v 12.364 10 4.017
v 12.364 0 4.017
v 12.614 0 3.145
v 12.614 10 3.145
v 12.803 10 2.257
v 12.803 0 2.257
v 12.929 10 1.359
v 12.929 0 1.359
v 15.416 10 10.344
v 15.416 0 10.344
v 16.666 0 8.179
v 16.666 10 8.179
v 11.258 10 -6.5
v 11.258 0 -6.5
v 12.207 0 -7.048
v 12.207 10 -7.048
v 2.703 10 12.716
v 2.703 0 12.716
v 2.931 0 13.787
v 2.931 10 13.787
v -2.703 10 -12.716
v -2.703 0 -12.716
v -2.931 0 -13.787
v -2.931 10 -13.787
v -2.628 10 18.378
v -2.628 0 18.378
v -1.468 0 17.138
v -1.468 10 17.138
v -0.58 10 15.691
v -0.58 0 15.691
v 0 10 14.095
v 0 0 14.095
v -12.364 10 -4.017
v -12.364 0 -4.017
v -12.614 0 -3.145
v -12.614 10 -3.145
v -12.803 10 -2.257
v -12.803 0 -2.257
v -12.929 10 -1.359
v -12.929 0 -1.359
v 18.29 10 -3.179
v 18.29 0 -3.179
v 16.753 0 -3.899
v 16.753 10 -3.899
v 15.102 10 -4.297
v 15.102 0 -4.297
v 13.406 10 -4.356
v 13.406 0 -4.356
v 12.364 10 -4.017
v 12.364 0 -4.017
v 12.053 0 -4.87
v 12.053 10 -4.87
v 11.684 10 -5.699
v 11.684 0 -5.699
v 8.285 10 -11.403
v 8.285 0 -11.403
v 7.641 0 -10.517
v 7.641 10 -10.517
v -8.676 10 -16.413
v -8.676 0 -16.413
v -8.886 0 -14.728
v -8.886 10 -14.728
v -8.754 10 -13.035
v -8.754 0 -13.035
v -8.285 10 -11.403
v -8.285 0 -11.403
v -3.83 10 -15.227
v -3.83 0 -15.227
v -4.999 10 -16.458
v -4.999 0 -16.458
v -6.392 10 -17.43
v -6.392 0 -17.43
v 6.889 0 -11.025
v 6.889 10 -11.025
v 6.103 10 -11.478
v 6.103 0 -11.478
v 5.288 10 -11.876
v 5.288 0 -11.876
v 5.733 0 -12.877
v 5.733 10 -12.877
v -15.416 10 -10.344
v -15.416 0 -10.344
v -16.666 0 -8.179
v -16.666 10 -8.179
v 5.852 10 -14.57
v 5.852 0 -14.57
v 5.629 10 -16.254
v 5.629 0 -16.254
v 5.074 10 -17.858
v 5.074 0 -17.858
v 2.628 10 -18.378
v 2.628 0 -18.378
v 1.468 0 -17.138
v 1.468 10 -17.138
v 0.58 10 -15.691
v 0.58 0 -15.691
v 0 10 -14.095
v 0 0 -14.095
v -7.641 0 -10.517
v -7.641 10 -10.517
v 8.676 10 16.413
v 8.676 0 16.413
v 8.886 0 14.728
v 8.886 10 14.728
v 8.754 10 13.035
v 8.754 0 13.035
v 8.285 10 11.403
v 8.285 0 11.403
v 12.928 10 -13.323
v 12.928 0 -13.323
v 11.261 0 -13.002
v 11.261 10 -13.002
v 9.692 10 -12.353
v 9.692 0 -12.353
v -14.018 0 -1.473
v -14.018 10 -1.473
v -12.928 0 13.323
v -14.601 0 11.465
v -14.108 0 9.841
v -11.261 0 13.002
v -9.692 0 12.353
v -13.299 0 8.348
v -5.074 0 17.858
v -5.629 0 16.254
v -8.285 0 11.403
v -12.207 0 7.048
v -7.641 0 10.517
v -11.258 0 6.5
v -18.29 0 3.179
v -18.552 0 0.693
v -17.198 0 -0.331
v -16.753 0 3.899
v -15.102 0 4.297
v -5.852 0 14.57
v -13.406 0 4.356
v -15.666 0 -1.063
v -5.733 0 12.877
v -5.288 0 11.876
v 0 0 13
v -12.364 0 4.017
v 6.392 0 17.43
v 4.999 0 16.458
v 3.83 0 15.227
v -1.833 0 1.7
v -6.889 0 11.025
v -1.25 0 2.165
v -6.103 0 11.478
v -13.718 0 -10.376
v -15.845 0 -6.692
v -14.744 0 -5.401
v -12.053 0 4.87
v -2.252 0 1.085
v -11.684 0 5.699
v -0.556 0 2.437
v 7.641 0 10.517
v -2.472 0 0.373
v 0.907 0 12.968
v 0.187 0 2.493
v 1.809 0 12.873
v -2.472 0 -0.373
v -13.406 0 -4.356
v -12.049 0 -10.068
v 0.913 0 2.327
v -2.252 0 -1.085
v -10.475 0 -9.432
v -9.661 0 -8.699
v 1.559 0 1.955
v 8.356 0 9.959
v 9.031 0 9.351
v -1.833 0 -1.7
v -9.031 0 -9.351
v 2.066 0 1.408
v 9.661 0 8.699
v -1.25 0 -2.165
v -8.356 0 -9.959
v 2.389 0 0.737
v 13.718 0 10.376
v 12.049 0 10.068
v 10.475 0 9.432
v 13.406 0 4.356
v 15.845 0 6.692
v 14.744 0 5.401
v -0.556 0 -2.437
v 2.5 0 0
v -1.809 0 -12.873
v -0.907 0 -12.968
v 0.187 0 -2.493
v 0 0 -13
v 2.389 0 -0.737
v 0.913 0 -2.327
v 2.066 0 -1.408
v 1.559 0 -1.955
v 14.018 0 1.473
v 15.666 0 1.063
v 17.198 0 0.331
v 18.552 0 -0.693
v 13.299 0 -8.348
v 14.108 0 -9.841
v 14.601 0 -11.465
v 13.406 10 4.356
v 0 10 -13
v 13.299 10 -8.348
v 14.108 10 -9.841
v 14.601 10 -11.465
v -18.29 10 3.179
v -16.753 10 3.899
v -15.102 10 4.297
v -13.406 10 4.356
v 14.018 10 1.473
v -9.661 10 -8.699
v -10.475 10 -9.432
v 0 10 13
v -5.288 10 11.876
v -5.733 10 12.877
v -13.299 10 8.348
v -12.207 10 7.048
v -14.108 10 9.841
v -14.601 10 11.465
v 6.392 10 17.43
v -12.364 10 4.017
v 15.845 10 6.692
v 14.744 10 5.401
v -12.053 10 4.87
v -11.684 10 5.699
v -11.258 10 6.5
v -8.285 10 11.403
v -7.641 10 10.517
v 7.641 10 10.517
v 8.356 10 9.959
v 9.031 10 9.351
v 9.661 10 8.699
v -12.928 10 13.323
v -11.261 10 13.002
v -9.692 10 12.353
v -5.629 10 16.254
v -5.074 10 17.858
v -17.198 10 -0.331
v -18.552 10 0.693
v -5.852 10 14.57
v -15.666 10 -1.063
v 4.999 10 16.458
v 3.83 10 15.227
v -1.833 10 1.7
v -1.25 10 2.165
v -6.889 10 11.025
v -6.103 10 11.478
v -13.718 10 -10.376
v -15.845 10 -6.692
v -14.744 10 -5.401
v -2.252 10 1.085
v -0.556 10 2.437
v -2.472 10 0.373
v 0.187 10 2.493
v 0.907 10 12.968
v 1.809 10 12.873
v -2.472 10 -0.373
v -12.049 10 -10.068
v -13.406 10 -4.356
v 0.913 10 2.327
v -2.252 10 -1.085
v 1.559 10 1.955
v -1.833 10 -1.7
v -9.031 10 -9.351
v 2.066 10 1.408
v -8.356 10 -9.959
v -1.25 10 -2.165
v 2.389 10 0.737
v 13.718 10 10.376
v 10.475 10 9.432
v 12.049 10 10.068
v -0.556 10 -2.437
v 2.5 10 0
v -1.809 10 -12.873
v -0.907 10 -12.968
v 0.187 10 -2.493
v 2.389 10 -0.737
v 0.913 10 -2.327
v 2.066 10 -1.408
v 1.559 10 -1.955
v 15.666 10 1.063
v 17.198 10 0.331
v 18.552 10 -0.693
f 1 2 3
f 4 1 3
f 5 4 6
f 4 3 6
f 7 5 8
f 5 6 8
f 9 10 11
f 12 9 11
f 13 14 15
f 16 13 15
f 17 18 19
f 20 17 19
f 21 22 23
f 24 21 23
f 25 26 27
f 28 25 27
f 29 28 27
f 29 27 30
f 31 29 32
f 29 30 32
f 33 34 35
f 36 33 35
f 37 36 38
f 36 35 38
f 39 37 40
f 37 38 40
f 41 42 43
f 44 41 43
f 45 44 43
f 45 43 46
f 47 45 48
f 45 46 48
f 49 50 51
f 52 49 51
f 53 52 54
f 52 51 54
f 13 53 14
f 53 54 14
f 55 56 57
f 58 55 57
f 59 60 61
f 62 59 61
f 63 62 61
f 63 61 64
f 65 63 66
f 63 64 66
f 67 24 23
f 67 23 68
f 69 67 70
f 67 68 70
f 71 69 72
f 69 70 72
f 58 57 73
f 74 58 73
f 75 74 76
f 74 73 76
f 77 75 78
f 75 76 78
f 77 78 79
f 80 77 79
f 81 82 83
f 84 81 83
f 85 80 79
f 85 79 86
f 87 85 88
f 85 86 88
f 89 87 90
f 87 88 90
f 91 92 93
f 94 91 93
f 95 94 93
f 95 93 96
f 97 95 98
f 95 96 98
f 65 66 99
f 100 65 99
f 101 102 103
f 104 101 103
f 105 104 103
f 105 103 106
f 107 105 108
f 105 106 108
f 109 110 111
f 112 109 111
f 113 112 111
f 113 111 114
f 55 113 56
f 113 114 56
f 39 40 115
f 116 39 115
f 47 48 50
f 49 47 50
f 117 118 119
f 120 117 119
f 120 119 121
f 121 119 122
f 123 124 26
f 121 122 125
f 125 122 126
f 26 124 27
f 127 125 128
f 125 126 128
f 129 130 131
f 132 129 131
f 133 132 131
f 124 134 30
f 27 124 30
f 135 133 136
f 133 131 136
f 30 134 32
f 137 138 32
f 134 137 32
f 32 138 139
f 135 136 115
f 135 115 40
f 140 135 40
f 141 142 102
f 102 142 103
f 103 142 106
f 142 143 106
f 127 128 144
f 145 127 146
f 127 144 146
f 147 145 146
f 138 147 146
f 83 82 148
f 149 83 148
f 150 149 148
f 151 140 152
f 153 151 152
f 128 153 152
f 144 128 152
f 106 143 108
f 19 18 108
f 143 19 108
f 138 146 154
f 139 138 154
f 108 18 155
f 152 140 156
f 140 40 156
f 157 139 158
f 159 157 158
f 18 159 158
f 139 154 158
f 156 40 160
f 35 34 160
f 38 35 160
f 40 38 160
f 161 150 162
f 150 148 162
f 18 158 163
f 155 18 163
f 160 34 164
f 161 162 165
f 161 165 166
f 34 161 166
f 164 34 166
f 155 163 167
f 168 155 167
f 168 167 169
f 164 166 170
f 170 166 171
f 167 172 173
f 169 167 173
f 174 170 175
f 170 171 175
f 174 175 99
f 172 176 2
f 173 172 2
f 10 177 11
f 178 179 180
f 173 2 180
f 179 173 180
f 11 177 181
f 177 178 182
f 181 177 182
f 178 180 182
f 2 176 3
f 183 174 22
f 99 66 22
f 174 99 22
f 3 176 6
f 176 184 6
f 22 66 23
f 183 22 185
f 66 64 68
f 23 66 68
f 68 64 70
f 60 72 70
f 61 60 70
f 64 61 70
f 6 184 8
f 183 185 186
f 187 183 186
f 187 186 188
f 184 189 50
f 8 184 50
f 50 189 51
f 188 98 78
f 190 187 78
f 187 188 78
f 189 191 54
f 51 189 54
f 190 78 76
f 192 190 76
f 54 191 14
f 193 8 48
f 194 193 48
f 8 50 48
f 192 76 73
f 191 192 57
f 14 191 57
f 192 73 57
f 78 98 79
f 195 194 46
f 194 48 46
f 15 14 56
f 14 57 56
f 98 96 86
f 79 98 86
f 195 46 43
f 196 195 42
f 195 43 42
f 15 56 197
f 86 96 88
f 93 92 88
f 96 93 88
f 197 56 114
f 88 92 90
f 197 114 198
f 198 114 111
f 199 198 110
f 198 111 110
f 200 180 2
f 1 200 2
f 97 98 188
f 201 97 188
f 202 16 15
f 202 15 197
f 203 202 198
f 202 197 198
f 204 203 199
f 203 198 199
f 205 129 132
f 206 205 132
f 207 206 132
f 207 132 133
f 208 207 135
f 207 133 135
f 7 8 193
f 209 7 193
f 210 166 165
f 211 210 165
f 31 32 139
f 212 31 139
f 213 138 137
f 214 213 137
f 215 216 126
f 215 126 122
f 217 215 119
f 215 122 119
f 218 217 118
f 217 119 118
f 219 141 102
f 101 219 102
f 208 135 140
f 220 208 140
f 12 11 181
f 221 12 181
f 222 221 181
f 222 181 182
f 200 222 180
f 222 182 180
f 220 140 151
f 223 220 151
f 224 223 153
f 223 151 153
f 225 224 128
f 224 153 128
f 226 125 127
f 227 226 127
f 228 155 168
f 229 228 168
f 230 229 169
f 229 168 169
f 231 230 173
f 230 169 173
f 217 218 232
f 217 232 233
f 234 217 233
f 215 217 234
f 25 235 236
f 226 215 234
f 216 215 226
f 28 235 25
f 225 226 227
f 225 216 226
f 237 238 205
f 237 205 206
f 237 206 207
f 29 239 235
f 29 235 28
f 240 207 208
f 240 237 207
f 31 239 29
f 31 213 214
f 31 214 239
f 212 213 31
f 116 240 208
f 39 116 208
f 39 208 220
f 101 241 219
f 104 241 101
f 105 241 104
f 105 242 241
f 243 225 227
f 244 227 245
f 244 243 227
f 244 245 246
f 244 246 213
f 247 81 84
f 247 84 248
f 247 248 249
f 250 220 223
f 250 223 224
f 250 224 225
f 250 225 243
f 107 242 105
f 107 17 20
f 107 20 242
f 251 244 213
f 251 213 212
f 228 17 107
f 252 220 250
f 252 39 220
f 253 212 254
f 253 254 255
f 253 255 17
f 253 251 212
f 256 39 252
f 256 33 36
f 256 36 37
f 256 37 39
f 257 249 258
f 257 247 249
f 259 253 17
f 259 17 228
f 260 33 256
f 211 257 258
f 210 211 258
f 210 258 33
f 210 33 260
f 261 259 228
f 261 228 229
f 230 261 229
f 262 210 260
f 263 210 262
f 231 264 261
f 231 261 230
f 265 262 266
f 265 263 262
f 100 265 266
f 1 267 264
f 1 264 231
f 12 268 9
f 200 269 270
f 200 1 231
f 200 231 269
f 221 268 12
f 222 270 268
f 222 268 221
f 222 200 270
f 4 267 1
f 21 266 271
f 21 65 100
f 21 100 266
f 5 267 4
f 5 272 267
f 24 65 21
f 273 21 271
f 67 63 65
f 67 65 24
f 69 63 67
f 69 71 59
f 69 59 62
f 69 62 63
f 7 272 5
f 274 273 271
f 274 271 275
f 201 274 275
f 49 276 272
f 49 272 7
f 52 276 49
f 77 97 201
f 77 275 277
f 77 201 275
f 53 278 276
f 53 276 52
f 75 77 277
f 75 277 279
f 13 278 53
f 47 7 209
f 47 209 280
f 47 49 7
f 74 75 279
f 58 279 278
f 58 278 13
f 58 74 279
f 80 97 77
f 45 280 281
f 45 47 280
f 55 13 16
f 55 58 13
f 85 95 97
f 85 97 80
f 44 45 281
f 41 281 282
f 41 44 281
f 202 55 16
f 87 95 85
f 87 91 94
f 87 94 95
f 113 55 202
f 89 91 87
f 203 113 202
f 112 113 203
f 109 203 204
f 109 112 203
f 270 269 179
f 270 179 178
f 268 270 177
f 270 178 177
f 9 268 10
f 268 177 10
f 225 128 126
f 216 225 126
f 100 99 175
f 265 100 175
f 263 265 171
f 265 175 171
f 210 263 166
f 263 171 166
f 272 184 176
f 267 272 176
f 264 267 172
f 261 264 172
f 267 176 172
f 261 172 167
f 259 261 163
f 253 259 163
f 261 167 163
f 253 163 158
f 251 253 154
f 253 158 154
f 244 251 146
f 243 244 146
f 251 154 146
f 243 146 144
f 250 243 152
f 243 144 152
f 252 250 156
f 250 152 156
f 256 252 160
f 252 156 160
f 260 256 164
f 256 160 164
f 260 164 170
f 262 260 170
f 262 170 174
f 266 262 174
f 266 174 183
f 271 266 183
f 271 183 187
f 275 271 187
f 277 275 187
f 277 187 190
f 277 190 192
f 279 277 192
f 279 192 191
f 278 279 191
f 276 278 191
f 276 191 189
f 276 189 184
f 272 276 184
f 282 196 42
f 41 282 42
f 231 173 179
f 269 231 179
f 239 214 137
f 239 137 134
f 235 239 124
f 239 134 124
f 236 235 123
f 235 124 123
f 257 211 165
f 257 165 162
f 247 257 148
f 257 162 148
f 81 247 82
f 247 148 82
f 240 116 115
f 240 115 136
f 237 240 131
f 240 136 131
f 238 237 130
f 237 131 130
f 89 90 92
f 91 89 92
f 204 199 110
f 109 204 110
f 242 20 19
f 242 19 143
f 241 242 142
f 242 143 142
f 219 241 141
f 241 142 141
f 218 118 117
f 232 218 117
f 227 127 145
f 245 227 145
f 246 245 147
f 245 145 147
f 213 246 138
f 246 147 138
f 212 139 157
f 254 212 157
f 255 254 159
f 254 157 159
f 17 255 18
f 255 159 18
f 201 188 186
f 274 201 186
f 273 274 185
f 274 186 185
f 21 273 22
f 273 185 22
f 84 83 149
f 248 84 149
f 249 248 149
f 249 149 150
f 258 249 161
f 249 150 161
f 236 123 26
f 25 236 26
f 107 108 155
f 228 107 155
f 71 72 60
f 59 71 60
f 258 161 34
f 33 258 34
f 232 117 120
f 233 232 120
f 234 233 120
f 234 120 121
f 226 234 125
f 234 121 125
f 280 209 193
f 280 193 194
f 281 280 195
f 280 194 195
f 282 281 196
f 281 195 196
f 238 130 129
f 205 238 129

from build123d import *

# Parameters (mm, degrees)
BOSS_EXTRUDE2_DEPTH = 10
CIRPATTERN1_COUNT   = 10
SKETCH1_5_R         = 13
BOSS_EXTRUDE3_DEPTH = 10
SKETCH2_R           = 2.5
CUT_EXTRUDE1_DEPTH  = 28.962538453


with BuildPart() as part:
    # Sketch1 → Boss-Extrude2 (new body)
    with BuildSketch(Plane(origin=(0, 0, 0), x_dir=(1, 0, 0), z_dir=(0, 1, 0))):
        with BuildLine():
            ThreePointArc((2.628362747, 18.377642448), (0.987757529, 16.436868415), (0, 14.095389312))
            Line((0, 14.095389312), (0, 13))
            ThreePointArc((0, 13), (2.702851981, 12.71591881), (5.28757636, 11.876090949))
            Line((5.28757636, 11.876090949), (5.733111332, 12.876778879))
            ThreePointArc((5.733111332, 12.876778879), (5.783115278, 15.41758366), (5.073731749, 17.857863221))
            Line((5.073731749, 17.857863221), (2.628362747, 18.377642448))
        make_face()
    extrude(amount=BOSS_EXTRUDE2_DEPTH)


with BuildPart() as cirpattern1_1:
    # CirPattern1: pattern copy
    add(part.part.rotate(Axis((0, 10.5, 0), (0, -1, 0)), 1 * 360 / CIRPATTERN1_COUNT))


with BuildPart() as cirpattern1_2:
    # CirPattern1: pattern copy
    add(part.part.rotate(Axis((0, 10.5, 0), (0, -1, 0)), 2 * 360 / CIRPATTERN1_COUNT))


with BuildPart() as cirpattern1_3:
    # CirPattern1: pattern copy
    add(part.part.rotate(Axis((0, 10.5, 0), (0, -1, 0)), 3 * 360 / CIRPATTERN1_COUNT))


with BuildPart() as cirpattern1_4:
    # CirPattern1: pattern copy
    add(part.part.rotate(Axis((0, 10.5, 0), (0, -1, 0)), 4 * 360 / CIRPATTERN1_COUNT))


with BuildPart() as cirpattern1_5:
    # CirPattern1: pattern copy
    add(part.part.rotate(Axis((0, 10.5, 0), (0, -1, 0)), 5 * 360 / CIRPATTERN1_COUNT))


with BuildPart() as cirpattern1_6:
    # CirPattern1: pattern copy
    add(part.part.rotate(Axis((0, 10.5, 0), (0, -1, 0)), 6 * 360 / CIRPATTERN1_COUNT))


with BuildPart() as cirpattern1_7:
    # CirPattern1: pattern copy
    add(part.part.rotate(Axis((0, 10.5, 0), (0, -1, 0)), 7 * 360 / CIRPATTERN1_COUNT))


with BuildPart() as cirpattern1_8:
    # CirPattern1: pattern copy
    add(part.part.rotate(Axis((0, 10.5, 0), (0, -1, 0)), 8 * 360 / CIRPATTERN1_COUNT))


with BuildPart() as cirpattern1_9:
    # CirPattern1: pattern copy
    add(part.part.rotate(Axis((0, 10.5, 0), (0, -1, 0)), 9 * 360 / CIRPATTERN1_COUNT))


with BuildPart() as part_1:
    add(part.part)

    add(cirpattern1_1.part)  # Boss-Extrude3 merges CirPattern1_1

    add(cirpattern1_2.part)  # Boss-Extrude3 merges CirPattern1_2

    add(cirpattern1_3.part)  # Boss-Extrude3 merges CirPattern1_3

    add(cirpattern1_4.part)  # Boss-Extrude3 merges CirPattern1_4

    add(cirpattern1_5.part)  # Boss-Extrude3 merges CirPattern1_5

    add(cirpattern1_6.part)  # Boss-Extrude3 merges CirPattern1_6

    add(cirpattern1_7.part)  # Boss-Extrude3 merges CirPattern1_7

    add(cirpattern1_8.part)  # Boss-Extrude3 merges CirPattern1_8

    add(cirpattern1_9.part)  # Boss-Extrude3 merges CirPattern1_9
    # Sketch1<5> → Boss-Extrude3 (add)
    with BuildSketch(Plane(origin=(0, 0, 0), x_dir=(1, 0, 0), z_dir=(0, 1, 0))):
        Circle(SKETCH1_5_R)
    extrude(amount=BOSS_EXTRUDE3_DEPTH)

    # Sketch2 → Cut-Extrude1 (cut, through all)
    with BuildSketch(Plane.XZ):
        Circle(SKETCH2_R)
    extrude(amount=-CUT_EXTRUDE1_DEPTH, mode=Mode.SUBTRACT)


solid = part_1.part
